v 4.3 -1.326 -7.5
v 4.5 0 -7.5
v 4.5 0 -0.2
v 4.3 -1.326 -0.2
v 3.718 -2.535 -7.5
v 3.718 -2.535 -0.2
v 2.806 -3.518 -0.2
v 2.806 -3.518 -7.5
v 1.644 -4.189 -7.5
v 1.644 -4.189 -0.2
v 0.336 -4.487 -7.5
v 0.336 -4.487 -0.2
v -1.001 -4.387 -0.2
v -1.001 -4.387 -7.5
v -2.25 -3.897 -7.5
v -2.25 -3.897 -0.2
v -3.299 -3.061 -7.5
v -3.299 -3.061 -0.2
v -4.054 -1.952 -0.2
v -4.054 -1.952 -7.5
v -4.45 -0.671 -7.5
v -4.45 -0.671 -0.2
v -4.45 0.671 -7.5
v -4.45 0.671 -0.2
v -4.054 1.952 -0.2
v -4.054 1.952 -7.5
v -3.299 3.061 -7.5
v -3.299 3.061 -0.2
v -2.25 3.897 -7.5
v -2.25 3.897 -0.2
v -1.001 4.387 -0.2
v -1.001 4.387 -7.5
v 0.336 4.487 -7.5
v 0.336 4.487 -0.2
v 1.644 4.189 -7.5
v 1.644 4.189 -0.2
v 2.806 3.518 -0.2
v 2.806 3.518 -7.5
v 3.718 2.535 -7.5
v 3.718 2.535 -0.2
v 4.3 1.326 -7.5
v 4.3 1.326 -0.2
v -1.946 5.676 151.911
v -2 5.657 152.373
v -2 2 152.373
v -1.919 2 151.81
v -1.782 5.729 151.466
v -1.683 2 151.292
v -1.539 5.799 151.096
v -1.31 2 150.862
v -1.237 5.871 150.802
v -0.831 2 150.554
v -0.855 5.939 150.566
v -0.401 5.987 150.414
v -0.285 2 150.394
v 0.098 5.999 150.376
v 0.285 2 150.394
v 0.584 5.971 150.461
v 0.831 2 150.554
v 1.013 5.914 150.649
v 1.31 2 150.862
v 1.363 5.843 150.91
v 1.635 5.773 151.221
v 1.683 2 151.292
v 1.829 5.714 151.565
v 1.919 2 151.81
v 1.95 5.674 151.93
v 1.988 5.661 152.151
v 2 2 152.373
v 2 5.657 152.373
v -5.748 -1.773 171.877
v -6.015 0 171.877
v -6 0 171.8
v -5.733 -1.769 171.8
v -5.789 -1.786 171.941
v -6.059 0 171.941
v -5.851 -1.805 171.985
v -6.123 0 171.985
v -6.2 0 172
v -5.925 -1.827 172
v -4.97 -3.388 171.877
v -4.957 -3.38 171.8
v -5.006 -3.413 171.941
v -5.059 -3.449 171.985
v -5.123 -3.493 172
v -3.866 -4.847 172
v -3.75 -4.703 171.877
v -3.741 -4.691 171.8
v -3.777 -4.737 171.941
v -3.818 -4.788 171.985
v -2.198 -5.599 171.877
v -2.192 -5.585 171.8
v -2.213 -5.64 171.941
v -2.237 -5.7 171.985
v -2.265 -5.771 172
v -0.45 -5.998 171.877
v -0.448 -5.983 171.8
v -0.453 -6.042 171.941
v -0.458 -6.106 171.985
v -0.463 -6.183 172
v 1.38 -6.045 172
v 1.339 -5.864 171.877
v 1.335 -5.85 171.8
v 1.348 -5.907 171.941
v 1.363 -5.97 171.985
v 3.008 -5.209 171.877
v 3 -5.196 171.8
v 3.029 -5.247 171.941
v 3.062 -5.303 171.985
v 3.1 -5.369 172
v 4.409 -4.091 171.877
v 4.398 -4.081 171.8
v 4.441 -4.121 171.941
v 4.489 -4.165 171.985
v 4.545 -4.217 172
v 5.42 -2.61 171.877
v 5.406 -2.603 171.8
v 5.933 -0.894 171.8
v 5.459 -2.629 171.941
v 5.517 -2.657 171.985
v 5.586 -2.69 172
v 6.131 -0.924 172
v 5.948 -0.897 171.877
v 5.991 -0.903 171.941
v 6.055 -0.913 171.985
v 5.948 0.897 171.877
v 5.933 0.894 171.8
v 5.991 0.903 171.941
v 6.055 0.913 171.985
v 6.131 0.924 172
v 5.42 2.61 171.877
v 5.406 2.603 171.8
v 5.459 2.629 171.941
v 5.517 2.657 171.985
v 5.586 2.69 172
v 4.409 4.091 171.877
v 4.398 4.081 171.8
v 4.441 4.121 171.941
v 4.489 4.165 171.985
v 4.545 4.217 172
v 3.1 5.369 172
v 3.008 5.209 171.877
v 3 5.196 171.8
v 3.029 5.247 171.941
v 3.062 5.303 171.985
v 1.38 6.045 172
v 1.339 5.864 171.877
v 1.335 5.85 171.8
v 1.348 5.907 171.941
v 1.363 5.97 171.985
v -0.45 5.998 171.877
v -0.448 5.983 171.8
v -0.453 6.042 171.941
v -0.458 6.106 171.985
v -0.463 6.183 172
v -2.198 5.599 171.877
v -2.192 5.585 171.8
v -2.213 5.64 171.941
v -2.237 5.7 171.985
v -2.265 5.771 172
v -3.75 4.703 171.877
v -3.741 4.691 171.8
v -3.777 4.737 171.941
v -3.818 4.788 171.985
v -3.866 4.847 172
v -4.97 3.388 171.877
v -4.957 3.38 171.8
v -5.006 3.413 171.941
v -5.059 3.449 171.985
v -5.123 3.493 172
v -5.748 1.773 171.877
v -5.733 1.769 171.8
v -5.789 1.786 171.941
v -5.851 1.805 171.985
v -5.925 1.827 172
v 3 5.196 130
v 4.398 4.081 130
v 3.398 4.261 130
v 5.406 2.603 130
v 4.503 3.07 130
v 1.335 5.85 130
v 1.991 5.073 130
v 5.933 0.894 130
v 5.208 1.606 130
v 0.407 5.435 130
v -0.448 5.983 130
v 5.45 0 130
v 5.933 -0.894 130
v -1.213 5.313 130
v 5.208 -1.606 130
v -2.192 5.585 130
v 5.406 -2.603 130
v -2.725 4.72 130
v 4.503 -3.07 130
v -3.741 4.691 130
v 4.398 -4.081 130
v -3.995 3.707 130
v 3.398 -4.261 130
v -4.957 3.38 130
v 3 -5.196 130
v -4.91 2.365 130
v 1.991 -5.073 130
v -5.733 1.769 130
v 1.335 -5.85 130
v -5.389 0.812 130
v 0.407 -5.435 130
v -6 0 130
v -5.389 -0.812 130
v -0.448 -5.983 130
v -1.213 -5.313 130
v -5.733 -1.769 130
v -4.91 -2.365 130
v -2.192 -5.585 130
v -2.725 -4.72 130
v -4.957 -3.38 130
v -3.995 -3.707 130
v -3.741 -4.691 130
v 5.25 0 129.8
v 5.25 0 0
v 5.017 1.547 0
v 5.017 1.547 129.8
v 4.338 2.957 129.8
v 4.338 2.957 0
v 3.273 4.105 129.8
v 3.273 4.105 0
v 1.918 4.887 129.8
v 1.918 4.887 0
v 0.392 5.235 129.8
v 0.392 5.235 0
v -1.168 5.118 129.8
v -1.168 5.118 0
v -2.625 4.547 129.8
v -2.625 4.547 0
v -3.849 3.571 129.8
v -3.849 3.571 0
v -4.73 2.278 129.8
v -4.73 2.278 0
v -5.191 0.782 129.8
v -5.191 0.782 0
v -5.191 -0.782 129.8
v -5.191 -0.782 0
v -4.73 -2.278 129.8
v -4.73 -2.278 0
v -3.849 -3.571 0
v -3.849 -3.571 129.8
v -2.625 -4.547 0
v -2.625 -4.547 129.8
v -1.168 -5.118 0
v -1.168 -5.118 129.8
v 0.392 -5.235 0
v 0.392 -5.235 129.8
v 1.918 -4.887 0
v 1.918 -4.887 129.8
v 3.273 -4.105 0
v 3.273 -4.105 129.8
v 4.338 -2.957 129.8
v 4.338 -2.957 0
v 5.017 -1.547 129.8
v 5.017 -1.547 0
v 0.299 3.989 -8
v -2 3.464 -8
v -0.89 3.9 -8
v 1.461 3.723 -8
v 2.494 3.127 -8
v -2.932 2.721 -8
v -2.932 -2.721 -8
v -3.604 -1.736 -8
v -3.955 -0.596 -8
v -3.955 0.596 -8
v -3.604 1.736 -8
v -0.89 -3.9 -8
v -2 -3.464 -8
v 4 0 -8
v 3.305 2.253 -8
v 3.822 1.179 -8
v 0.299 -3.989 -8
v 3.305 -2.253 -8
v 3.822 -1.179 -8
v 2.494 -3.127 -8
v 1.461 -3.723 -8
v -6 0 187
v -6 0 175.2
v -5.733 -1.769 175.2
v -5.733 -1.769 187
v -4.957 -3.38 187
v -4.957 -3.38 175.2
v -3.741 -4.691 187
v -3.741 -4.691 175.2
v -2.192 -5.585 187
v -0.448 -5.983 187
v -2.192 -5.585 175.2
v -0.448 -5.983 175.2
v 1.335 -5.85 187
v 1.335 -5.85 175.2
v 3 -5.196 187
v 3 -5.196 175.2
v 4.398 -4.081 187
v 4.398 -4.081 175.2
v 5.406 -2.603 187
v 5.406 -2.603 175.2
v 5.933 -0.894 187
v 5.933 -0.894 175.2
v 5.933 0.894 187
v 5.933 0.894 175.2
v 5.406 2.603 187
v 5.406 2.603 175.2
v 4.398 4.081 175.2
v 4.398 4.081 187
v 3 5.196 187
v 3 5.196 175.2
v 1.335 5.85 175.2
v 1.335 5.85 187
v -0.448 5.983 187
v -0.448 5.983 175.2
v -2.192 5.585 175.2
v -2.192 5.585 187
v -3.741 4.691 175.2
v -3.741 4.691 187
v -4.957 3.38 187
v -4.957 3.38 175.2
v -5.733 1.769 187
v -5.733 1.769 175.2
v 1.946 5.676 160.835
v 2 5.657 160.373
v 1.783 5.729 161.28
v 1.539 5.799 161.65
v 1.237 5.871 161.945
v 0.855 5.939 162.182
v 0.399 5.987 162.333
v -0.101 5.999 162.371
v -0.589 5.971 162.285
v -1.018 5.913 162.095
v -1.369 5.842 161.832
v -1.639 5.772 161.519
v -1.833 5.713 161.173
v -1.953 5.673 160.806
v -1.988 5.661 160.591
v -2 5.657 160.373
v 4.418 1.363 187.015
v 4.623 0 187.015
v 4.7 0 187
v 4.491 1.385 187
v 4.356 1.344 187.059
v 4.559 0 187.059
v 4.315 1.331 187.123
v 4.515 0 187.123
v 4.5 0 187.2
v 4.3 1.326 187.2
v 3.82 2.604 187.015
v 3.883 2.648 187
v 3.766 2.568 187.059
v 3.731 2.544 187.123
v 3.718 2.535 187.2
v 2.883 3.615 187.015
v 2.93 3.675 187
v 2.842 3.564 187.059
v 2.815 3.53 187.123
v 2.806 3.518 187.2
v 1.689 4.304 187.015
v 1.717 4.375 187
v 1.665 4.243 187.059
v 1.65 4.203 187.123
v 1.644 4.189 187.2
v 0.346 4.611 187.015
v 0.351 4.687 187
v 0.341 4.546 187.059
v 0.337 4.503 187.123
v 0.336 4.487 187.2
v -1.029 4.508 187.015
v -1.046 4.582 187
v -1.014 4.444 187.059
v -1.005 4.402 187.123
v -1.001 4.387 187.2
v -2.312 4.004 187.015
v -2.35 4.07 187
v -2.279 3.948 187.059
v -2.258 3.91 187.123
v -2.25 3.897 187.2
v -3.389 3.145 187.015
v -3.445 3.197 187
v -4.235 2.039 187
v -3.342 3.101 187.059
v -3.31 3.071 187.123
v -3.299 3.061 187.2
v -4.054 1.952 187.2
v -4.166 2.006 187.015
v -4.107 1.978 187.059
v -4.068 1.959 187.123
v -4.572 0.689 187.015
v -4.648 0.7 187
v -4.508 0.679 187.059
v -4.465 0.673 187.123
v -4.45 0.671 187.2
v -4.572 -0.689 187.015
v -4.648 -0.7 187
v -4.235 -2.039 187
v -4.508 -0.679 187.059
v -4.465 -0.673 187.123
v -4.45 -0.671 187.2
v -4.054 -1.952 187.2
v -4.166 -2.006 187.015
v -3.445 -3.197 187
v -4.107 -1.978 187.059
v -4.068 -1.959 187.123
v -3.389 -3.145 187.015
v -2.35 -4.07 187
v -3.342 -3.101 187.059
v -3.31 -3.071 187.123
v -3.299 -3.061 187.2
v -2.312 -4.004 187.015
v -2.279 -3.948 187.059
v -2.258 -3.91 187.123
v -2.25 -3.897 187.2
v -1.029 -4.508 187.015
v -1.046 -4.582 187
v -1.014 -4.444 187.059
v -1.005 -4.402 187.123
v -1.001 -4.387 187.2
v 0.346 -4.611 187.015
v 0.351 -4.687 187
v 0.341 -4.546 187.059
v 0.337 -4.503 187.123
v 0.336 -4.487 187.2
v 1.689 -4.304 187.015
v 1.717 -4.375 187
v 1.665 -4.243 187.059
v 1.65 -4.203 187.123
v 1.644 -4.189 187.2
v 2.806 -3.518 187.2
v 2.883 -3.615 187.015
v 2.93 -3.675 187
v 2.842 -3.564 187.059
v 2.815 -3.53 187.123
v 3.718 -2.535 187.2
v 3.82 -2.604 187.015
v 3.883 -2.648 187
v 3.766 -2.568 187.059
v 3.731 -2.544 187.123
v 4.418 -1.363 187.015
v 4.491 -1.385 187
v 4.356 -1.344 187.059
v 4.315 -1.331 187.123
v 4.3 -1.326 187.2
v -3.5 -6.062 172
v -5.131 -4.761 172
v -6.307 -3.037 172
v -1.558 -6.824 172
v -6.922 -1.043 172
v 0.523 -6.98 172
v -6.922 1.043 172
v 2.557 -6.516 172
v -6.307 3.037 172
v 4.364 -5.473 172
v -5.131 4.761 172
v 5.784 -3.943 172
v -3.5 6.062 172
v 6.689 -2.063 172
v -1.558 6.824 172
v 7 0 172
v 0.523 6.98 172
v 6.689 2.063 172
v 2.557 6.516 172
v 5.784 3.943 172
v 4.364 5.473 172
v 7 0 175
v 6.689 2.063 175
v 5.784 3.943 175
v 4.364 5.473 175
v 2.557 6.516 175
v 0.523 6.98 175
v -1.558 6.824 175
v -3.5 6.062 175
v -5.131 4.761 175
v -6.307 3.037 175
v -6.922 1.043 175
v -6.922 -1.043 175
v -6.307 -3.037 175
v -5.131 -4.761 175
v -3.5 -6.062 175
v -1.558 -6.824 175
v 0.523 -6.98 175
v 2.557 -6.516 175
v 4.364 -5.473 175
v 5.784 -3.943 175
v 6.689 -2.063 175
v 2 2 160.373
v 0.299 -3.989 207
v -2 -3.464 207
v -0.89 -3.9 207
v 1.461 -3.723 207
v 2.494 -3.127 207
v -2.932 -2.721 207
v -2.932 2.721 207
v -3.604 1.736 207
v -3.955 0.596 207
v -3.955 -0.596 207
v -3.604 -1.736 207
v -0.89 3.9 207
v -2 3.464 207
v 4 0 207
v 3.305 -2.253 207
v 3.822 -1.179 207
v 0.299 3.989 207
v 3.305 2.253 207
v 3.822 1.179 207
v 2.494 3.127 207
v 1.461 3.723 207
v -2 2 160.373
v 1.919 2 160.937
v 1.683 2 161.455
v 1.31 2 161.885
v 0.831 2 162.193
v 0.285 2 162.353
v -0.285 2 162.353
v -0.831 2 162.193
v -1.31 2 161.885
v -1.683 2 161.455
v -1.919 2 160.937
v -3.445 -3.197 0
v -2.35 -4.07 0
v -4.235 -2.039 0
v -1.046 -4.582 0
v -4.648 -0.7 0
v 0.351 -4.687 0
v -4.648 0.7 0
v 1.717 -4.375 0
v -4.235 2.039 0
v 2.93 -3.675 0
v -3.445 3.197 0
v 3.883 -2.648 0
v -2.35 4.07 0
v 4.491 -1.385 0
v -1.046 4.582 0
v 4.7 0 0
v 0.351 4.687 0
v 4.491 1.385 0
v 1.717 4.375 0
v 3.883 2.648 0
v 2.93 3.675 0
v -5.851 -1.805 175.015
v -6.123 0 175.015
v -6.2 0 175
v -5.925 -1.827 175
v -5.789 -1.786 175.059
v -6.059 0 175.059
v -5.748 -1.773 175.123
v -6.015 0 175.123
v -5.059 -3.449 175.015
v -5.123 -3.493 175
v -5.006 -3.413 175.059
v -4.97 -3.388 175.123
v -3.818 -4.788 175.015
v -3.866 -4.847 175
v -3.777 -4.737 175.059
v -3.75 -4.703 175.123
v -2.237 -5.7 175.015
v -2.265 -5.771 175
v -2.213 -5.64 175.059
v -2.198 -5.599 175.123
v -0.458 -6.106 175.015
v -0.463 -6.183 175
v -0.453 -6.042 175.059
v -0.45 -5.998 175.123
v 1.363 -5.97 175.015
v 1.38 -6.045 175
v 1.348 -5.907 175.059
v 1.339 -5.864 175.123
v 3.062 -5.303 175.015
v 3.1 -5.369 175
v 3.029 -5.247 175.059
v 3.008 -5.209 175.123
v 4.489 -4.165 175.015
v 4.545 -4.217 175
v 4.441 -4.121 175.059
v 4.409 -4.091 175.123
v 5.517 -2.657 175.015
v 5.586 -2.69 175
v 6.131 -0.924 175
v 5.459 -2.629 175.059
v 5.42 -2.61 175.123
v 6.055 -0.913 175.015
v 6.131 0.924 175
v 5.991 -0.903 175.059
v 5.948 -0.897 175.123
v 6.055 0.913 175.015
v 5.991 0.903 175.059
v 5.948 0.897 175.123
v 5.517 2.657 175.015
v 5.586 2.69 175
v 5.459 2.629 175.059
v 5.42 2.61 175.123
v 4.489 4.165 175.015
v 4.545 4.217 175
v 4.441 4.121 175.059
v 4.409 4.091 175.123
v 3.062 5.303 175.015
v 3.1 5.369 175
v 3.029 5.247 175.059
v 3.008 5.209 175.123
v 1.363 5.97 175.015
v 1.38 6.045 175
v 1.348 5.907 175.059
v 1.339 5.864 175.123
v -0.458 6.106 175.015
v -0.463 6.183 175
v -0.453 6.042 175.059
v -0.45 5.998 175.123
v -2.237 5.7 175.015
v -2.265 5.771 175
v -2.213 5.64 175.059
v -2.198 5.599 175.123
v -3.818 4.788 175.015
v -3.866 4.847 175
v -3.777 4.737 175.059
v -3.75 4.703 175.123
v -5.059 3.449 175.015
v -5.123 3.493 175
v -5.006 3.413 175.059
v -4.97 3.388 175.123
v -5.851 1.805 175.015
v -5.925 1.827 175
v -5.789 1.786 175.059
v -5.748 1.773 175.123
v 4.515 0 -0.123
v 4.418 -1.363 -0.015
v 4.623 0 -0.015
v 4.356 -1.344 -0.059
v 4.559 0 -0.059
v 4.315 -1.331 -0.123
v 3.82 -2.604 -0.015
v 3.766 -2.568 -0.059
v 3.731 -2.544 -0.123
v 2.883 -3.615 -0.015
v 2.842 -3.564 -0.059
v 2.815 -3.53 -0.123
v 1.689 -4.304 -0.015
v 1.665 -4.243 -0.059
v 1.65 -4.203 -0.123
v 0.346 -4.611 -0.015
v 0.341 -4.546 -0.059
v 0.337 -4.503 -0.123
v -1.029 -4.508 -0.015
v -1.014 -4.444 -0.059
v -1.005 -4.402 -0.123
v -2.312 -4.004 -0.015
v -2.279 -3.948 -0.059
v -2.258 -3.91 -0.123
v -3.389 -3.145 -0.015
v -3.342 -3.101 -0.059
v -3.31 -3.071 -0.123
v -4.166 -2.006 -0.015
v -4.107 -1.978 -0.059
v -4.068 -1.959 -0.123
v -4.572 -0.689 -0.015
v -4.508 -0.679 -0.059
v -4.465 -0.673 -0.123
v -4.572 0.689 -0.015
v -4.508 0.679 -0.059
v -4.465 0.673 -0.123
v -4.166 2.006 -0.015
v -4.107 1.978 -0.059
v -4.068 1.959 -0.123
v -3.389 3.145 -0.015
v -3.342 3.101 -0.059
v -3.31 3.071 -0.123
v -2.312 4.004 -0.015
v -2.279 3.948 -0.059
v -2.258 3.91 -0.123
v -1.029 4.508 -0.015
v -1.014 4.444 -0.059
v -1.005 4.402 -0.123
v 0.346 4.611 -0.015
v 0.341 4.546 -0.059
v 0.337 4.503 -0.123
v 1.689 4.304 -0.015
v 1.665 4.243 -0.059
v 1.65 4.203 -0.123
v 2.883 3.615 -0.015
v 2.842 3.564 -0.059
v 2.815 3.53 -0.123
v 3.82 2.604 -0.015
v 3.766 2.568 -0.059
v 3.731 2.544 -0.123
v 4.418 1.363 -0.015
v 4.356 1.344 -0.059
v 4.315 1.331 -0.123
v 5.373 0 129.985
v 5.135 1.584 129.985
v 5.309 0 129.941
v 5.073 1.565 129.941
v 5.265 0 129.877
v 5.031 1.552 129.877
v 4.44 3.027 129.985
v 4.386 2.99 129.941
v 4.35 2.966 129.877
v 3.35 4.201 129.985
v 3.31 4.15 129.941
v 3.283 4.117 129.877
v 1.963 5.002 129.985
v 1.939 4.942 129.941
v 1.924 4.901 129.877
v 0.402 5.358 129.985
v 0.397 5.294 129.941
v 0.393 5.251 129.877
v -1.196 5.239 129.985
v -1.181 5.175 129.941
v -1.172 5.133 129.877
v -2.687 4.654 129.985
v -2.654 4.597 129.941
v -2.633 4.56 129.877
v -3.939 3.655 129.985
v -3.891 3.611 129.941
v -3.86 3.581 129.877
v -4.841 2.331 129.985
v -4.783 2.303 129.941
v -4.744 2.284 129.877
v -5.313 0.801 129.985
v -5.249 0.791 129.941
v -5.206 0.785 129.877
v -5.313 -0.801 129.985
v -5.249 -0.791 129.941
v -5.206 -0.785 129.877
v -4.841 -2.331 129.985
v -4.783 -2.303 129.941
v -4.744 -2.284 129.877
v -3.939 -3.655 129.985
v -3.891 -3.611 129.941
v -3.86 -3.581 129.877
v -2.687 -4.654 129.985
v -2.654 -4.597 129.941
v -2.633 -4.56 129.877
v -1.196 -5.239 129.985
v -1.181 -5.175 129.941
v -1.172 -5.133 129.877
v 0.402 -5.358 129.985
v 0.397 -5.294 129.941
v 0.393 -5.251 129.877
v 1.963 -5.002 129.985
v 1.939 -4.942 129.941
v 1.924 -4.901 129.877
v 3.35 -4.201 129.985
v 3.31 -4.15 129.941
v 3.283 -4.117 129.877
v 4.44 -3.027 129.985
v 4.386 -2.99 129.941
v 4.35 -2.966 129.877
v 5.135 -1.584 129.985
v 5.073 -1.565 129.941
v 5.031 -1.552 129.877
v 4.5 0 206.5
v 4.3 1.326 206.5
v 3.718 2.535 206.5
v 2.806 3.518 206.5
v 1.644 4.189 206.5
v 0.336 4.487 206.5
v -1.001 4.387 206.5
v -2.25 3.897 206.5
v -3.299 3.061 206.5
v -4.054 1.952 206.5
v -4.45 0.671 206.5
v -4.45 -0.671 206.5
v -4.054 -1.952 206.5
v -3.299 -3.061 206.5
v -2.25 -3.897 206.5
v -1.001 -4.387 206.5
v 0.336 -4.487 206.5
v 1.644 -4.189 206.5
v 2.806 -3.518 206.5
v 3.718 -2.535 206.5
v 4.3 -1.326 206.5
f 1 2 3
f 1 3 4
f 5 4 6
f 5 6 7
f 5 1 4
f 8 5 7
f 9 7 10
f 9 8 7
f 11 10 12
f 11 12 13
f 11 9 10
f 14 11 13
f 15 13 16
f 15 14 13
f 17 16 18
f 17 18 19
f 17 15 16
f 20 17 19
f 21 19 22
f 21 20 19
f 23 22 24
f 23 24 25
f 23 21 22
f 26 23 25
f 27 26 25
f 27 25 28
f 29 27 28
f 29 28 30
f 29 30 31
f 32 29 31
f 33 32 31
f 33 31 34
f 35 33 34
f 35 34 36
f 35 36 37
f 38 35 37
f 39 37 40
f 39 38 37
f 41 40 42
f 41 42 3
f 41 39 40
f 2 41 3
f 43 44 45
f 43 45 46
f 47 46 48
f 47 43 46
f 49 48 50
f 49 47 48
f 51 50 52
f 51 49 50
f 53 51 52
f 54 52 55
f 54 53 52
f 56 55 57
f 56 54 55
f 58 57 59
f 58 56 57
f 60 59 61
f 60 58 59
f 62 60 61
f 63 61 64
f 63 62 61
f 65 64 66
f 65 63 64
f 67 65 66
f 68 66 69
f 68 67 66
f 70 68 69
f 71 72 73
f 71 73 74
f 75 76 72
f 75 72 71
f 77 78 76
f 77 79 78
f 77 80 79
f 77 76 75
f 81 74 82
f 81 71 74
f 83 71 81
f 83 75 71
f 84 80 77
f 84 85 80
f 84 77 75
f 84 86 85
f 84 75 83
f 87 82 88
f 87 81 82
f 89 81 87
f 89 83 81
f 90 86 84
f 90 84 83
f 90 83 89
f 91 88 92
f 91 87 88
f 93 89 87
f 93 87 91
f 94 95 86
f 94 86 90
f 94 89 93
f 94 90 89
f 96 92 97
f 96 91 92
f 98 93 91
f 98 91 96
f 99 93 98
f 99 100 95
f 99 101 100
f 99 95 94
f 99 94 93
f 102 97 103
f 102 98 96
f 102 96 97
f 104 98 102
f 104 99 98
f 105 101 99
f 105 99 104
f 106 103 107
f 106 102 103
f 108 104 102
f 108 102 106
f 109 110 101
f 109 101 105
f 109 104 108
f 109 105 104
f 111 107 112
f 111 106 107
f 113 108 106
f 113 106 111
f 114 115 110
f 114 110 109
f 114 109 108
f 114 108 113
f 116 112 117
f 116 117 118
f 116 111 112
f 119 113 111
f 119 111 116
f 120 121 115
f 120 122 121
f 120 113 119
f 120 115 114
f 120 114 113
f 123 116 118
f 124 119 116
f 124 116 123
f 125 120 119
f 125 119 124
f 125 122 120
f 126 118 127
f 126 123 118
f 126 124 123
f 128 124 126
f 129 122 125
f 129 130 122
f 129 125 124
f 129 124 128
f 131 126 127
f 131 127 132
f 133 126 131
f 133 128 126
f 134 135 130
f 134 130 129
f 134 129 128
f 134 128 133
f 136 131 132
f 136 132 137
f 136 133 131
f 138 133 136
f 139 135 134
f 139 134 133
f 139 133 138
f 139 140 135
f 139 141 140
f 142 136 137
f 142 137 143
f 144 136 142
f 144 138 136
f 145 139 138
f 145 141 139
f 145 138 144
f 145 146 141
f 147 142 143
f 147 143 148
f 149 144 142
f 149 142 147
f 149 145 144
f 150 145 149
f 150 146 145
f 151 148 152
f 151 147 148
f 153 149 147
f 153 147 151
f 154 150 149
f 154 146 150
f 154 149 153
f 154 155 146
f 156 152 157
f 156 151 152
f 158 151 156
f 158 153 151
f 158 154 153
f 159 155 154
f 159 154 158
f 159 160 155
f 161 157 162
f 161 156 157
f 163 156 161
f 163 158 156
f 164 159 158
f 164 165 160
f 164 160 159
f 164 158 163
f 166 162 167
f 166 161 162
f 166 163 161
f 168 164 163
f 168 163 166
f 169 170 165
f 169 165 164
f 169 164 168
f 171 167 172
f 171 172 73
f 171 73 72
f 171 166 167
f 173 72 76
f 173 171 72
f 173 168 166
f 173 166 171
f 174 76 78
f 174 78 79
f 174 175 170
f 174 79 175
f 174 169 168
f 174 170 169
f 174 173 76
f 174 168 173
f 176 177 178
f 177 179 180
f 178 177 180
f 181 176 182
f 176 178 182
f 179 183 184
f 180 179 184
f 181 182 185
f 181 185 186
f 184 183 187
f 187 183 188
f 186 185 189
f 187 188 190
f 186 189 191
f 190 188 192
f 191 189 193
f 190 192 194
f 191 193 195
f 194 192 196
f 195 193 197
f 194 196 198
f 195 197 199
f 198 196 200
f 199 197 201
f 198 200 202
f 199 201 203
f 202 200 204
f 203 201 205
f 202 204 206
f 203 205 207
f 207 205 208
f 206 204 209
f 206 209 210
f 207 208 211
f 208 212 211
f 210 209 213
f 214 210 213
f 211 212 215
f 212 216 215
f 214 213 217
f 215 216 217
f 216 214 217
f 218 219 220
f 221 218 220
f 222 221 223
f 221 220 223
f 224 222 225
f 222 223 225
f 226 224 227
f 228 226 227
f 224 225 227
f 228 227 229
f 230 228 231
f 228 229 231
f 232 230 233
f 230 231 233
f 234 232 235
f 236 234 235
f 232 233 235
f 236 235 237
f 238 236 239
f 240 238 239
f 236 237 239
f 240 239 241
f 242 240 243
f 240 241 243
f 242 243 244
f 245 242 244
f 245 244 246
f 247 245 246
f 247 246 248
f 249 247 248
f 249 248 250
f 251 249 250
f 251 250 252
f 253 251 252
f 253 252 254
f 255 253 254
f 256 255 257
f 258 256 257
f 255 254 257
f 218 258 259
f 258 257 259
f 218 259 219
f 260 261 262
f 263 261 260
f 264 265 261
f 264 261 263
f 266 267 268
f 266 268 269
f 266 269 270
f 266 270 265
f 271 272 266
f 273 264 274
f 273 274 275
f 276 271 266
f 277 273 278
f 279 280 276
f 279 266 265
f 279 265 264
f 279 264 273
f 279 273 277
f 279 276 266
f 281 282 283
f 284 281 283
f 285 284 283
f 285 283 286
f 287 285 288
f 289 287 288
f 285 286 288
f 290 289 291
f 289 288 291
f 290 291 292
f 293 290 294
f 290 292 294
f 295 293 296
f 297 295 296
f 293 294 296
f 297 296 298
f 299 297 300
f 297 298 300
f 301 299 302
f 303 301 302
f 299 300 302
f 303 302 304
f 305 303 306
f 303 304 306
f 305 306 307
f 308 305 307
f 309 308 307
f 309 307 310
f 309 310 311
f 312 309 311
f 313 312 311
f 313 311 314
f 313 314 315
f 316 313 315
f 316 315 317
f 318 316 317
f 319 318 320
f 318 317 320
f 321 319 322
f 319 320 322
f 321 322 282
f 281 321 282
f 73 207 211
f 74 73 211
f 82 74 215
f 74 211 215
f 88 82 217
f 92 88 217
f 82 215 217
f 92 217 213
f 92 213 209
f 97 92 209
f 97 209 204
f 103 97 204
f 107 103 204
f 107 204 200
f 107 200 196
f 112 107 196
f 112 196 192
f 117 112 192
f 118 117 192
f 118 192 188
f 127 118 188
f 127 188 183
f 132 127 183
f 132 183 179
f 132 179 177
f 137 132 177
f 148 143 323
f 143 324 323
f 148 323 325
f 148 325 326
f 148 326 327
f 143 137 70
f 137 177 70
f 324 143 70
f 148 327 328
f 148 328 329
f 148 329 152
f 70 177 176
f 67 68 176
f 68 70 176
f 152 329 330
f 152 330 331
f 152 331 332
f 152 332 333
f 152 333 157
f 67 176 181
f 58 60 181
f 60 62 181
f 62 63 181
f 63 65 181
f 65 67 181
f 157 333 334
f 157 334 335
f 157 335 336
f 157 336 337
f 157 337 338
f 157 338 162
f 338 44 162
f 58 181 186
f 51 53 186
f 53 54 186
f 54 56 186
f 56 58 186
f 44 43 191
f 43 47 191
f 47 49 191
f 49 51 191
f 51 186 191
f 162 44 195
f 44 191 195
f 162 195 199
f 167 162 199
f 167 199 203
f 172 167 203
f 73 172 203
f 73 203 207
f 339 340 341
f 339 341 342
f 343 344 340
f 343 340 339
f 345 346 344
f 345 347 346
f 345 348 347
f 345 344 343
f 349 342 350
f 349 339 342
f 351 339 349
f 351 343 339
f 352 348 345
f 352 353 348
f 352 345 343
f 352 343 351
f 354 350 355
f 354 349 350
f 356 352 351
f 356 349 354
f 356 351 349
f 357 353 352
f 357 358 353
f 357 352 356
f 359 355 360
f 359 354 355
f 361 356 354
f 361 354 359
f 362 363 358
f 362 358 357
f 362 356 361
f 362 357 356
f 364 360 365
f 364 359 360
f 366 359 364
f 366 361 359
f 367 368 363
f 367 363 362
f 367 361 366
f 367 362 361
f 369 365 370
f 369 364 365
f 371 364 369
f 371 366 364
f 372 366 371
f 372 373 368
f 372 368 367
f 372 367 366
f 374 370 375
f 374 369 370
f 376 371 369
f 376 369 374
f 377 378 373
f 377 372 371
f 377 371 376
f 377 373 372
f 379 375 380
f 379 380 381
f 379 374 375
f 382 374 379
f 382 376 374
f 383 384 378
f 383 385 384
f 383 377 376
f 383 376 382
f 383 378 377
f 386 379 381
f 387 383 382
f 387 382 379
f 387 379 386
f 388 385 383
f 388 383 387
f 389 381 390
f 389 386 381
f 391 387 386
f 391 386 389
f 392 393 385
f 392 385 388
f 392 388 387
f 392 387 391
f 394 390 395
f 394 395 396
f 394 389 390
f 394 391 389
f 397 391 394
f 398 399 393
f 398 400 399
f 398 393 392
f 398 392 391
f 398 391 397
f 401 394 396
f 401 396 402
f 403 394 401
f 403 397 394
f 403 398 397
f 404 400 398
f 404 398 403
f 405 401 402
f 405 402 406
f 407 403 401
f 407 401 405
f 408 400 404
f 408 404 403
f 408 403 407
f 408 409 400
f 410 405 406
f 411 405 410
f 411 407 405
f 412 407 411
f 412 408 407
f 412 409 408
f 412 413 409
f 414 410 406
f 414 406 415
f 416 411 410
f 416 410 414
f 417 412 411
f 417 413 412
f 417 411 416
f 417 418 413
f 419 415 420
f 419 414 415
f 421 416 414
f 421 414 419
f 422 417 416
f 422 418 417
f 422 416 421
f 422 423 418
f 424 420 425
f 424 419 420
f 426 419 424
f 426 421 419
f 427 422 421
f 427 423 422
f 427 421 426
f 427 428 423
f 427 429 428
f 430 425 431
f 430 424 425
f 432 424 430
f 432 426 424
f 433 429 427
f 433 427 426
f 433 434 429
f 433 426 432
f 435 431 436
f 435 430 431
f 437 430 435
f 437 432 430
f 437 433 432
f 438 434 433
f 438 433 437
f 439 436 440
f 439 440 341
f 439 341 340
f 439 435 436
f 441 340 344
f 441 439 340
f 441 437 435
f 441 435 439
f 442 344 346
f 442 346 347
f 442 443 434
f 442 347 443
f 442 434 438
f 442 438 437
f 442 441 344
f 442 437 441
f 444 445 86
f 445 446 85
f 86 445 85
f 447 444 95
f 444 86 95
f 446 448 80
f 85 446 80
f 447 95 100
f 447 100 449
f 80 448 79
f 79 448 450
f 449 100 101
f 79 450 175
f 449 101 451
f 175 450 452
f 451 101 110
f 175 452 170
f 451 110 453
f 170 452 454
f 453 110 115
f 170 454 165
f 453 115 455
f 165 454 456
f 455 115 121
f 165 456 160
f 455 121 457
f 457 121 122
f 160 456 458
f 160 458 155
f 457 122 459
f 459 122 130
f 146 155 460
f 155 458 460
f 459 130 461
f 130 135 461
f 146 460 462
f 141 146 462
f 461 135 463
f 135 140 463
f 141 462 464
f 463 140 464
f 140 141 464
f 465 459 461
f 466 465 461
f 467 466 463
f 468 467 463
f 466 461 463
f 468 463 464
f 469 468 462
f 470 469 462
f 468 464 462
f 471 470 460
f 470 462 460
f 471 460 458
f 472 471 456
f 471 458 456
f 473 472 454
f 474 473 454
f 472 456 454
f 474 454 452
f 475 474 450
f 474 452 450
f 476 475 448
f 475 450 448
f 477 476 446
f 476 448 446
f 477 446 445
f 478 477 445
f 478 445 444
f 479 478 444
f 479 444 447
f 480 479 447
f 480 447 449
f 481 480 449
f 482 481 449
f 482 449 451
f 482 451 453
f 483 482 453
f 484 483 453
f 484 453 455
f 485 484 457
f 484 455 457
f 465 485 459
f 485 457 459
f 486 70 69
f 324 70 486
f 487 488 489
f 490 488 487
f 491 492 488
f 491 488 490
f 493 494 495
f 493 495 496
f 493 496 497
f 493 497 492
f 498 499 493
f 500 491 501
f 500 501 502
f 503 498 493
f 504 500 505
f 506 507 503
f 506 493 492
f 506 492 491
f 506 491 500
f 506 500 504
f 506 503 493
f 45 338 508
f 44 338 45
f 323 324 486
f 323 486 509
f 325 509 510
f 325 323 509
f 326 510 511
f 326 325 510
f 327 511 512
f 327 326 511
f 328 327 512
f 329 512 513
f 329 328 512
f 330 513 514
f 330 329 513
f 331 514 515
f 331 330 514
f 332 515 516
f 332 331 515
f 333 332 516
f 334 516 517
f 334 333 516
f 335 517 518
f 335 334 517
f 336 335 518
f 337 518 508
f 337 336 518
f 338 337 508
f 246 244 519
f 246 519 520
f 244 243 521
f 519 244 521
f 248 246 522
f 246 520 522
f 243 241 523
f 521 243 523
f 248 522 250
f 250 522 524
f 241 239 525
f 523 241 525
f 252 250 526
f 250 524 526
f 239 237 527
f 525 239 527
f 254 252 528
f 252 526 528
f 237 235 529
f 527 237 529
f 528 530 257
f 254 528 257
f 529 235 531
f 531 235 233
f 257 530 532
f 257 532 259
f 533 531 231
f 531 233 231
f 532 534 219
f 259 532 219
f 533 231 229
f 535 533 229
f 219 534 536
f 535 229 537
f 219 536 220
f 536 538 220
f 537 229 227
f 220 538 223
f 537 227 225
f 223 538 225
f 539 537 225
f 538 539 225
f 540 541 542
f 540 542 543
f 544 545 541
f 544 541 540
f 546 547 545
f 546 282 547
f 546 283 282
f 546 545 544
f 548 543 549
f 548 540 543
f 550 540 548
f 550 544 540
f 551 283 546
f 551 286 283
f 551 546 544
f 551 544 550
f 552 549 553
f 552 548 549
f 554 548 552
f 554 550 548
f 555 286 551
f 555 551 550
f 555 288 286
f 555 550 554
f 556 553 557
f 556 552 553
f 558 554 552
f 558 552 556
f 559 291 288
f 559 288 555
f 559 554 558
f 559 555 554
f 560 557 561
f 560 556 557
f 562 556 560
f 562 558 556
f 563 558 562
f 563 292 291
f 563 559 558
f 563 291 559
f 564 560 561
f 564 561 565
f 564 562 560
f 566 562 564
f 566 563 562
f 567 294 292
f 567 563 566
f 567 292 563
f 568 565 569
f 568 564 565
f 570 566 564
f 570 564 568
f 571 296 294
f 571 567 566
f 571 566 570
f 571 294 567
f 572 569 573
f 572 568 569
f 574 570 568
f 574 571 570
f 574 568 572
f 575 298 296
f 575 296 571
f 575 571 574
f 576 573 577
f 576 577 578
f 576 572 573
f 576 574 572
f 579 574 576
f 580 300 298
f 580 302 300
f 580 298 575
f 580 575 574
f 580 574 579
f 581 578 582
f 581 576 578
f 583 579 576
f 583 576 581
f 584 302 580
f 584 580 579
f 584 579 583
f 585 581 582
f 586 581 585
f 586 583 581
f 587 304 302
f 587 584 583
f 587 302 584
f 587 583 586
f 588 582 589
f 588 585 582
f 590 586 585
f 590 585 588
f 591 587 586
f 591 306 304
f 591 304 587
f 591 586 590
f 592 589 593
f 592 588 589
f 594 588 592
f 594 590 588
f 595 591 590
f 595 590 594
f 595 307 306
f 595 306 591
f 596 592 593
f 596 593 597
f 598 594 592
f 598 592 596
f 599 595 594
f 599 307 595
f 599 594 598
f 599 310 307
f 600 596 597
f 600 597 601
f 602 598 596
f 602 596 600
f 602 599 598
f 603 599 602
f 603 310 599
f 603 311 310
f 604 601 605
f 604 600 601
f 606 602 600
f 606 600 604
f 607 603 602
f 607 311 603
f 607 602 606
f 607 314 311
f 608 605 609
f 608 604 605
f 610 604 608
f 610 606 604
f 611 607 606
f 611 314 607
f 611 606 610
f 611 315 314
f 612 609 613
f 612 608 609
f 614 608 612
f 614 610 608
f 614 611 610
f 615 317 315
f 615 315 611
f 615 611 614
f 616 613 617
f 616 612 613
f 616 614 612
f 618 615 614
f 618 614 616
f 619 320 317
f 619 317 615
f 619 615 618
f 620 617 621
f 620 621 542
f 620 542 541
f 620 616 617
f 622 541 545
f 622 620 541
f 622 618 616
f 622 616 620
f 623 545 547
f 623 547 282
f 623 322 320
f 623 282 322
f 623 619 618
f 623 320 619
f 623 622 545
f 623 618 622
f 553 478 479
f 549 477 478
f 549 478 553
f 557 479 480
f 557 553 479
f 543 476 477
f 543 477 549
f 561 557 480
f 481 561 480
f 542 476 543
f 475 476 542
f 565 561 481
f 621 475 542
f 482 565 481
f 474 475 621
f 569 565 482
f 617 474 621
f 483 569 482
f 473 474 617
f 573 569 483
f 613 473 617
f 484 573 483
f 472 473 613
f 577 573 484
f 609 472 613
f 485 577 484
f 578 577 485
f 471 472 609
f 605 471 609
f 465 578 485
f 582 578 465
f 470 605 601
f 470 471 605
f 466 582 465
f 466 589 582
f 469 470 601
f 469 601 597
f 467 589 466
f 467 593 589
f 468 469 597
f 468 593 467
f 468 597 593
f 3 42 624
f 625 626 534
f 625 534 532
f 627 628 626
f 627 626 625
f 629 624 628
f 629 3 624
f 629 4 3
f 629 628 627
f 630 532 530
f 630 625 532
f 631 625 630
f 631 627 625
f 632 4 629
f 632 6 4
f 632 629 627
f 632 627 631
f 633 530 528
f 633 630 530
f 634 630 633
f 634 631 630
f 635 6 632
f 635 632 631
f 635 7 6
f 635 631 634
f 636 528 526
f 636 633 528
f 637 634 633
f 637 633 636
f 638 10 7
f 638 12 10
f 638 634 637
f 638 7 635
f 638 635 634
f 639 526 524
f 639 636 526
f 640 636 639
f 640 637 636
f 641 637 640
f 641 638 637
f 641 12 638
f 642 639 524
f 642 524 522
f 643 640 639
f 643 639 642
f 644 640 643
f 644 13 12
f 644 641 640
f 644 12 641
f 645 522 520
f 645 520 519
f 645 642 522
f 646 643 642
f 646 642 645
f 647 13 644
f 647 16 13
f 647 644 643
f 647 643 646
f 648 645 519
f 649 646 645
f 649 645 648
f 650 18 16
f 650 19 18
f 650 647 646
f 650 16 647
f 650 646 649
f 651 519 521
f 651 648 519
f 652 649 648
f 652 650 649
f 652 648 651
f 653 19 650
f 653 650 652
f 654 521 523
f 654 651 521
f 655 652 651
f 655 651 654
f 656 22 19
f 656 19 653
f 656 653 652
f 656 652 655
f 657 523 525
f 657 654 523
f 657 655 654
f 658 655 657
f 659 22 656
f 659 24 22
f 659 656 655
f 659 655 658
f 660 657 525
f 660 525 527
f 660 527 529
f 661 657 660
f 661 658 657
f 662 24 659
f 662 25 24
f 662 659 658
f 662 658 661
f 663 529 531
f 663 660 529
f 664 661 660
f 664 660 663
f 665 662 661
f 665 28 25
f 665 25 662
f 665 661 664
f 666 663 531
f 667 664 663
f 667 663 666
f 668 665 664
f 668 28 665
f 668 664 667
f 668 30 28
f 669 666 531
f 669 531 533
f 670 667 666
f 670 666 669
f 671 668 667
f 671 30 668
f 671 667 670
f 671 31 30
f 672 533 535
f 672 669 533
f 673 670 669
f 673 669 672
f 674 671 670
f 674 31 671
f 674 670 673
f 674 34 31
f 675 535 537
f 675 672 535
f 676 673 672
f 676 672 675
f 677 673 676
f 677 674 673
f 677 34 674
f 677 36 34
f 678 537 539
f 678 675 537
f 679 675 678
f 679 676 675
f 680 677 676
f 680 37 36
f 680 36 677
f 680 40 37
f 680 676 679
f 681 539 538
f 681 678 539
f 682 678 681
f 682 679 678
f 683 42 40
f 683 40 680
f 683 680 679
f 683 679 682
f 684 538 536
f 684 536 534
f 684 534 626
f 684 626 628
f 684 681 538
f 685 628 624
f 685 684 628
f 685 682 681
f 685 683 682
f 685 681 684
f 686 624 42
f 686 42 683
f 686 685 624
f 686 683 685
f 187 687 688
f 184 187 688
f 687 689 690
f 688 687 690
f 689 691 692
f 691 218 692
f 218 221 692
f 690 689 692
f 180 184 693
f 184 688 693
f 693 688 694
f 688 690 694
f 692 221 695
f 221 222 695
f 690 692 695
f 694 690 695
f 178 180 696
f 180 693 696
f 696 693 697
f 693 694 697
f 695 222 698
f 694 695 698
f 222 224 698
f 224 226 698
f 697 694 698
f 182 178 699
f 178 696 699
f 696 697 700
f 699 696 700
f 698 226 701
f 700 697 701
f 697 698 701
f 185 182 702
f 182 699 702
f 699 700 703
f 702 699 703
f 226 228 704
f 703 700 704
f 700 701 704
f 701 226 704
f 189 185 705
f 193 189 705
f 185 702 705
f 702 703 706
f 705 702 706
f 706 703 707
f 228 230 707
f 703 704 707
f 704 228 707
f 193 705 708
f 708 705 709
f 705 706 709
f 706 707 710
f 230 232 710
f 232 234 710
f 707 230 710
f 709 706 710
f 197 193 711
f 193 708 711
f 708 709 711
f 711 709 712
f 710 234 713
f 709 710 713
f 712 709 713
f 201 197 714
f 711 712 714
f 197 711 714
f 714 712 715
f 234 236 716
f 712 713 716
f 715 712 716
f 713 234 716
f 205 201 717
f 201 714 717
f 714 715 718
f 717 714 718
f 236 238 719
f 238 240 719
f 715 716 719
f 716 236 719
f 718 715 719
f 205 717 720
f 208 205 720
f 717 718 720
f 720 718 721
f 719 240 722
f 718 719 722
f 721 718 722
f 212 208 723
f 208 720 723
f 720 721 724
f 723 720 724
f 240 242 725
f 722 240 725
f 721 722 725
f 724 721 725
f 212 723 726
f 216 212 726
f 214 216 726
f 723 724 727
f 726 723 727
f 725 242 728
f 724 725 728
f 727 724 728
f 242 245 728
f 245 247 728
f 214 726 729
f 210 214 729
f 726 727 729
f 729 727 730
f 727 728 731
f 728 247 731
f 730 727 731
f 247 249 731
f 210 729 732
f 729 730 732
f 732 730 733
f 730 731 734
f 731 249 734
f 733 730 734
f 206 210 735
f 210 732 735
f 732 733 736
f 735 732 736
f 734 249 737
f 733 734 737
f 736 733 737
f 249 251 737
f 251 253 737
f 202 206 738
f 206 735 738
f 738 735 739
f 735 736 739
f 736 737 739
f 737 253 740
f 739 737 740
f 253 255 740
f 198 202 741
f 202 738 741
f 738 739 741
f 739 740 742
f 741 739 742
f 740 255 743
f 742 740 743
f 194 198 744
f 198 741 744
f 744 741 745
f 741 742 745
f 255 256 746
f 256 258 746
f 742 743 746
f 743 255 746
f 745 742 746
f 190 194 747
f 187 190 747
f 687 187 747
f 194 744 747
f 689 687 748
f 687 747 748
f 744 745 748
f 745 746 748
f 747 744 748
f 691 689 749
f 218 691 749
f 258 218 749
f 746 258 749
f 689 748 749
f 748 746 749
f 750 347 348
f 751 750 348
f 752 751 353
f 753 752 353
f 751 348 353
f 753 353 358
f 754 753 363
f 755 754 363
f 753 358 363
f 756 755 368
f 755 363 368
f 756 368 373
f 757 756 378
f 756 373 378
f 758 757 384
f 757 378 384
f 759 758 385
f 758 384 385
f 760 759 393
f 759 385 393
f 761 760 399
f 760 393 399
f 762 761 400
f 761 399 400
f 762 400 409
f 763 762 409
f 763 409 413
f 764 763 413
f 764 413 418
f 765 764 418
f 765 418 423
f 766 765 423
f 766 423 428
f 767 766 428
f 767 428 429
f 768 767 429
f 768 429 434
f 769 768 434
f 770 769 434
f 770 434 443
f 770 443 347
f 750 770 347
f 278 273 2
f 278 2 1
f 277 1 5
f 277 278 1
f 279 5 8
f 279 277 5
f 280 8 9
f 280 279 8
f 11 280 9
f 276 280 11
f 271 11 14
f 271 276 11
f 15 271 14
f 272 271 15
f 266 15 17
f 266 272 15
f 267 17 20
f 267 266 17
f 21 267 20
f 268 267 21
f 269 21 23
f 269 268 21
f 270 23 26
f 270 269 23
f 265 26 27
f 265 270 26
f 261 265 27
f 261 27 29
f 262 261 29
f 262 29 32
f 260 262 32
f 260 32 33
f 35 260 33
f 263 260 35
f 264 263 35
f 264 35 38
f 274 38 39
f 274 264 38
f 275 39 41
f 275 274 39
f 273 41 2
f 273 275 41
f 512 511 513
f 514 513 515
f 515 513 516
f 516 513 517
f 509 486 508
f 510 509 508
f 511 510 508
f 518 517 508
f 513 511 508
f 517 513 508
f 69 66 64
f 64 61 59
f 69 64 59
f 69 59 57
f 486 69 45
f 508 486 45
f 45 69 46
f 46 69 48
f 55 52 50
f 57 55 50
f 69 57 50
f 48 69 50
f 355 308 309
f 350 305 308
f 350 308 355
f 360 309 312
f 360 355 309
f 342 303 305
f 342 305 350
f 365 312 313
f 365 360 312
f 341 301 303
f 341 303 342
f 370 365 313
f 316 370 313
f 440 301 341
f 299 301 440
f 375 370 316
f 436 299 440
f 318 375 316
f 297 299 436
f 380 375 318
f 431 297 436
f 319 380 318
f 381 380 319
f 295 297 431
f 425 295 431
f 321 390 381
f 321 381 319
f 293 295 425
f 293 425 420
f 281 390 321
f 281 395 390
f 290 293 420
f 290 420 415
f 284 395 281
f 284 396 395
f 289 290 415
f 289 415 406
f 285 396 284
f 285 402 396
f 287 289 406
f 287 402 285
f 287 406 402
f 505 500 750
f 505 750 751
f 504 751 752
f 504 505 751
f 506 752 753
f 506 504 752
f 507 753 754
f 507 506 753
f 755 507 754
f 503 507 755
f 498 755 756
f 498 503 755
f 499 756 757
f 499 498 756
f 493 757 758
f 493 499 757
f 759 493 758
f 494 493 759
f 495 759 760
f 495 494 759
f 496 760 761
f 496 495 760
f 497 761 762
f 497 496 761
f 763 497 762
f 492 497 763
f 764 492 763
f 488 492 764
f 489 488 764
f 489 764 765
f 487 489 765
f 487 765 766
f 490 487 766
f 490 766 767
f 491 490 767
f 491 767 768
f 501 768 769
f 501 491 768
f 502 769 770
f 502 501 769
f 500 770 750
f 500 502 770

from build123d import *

# Parameters (mm, degrees)
SKETCH_1_R          = 5.25
EXTRUDE_1_DEPTH     = 130
SKETCH_2_R          = 6
EXTRUDE_2_DEPTH     = 42
SKETCH_3_R          = 7
EXTRUDE_3_DEPTH     = 3
SKETCH_4_R          = 6
EXTRUDE_4_DEPTH     = 12
SKETCH_5_R          = 4.5
EXTRUDE_5_DEPTH     = 8
EXTRUDE_START       = 8
SKETCH_6_R          = 4.5
EXTRUDE_6_DEPTH     = 8
CUT_EXTRUDE_1_DEPTH = 10
FILLET_2_R          = 0.2
FILLET_4_R          = 0.2
FILLET_5_R          = 0.2
SKETCH_19_R         = 4.5
EXTRUDE_7_DEPTH     = 12
FILLET_6_R          = 0.2
FILLET_7_R          = 0.2
CHAMFER_1_SIZE      = 0.5


with BuildPart() as part:
    # Эскиз1 → Бобышка-Вытянуть1 (new body)
    with BuildSketch(Plane.XY):
        Circle(SKETCH_1_R)
    extrude(amount=EXTRUDE_1_DEPTH)

    # Эскиз2 → Бобышка-Вытянуть2 (add)
    with BuildSketch(Plane.XY.offset(130)):
        with Locations(Location((0, 0, 0), (0, 0, 180))):
            Circle(SKETCH_2_R)
    extrude(amount=EXTRUDE_2_DEPTH)

    # Эскиз3 → Бобышка-Вытянуть3 (add)
    with BuildSketch(Plane.XY.offset(172)):
        Circle(SKETCH_3_R)
    extrude(amount=EXTRUDE_3_DEPTH)

    # Эскиз4 → Бобышка-Вытянуть4 (add)
    with BuildSketch(Plane.XY.offset(175)):
        with Locations(Location((0, 0, 0), (0, 0, 180))):
            Circle(SKETCH_4_R)
    extrude(amount=EXTRUDE_4_DEPTH)

    # Эскиз5 → Бобышка-Вытянуть5 (add)
    with BuildSketch(Plane.XY.offset(187)):
        Circle(SKETCH_5_R)
    extrude(amount=EXTRUDE_5_DEPTH)

    # Эскиз6 → Бобышка-Вытянуть6 (add)
    with BuildSketch(Plane(origin=(0, 0, 0), x_dir=(-1, 0, 0), z_dir=(0, 0, -1)).offset(EXTRUDE_START)):
        with Locations(Location((0, 0, 0), (0, 0, 180))):
            Circle(SKETCH_6_R)
    extrude(amount=-EXTRUDE_6_DEPTH)

    # Эскиз18 → Вырез-Вытянуть1 (cut)
    with BuildSketch(Plane(origin=(0, 12, 0), x_dir=(1, 0, 0), z_dir=(0, 1, 0))):
        with BuildLine():
            Line((-2, -160.373495066), (-2, -152.373495066))
            ThreePointArc((-2, -152.373495066), (0, -150.373495066), (2, -152.373495066))
            Line((2, -152.373495066), (2, -160.373495066))
            ThreePointArc((2, -160.373495066), (0, -162.373495066), (-2, -160.373495066))
        make_face()
    extrude(amount=-CUT_EXTRUDE_1_DEPTH, mode=Mode.SUBTRACT)

    # Скругление2
    fillet_2_edges = [part.edges().sort_by_distance(p)[0] for p in [
        (-4.5, 0, 0),
    ]]
    fillet(fillet_2_edges, radius=FILLET_2_R)

    # Скругление4
    fillet_4_edges = [part.edges().sort_by_distance(p)[0] for p in [
        (6, 0, 175),
    ]]
    fillet(fillet_4_edges, radius=FILLET_4_R)

    # Скругление5
    fillet_5_edges = [part.edges().sort_by_distance(p)[0] for p in [
        (-4.5, 0, 187),
    ]]
    fillet(fillet_5_edges, radius=FILLET_5_R)

    # Эскиз19 → Бобышка-Вытянуть7 (add)
    with BuildSketch(Plane.XY.offset(195)):
        Circle(SKETCH_19_R)
    extrude(amount=EXTRUDE_7_DEPTH)

    # Скругление6
    fillet_6_edges = [part.edges().sort_by_distance(p)[0] for p in [
        (-5.25, 0, 130),
    ]]
    fillet(fillet_6_edges, radius=FILLET_6_R)

    # Скругление7
    fillet_7_edges = [part.edges().sort_by_distance(p)[0] for p in [
        (6, 0, 172),
    ]]
    fillet(fillet_7_edges, radius=FILLET_7_R)

    # Фаска1
    chamfer_1_edges = [part.edges().sort_by_distance(p)[0] for p in [
        (-4.5, 0, -8),
        (-4.5, 0, 207),
    ]]
    chamfer(chamfer_1_edges, length=CHAMFER_1_SIZE)


solid = part.part
